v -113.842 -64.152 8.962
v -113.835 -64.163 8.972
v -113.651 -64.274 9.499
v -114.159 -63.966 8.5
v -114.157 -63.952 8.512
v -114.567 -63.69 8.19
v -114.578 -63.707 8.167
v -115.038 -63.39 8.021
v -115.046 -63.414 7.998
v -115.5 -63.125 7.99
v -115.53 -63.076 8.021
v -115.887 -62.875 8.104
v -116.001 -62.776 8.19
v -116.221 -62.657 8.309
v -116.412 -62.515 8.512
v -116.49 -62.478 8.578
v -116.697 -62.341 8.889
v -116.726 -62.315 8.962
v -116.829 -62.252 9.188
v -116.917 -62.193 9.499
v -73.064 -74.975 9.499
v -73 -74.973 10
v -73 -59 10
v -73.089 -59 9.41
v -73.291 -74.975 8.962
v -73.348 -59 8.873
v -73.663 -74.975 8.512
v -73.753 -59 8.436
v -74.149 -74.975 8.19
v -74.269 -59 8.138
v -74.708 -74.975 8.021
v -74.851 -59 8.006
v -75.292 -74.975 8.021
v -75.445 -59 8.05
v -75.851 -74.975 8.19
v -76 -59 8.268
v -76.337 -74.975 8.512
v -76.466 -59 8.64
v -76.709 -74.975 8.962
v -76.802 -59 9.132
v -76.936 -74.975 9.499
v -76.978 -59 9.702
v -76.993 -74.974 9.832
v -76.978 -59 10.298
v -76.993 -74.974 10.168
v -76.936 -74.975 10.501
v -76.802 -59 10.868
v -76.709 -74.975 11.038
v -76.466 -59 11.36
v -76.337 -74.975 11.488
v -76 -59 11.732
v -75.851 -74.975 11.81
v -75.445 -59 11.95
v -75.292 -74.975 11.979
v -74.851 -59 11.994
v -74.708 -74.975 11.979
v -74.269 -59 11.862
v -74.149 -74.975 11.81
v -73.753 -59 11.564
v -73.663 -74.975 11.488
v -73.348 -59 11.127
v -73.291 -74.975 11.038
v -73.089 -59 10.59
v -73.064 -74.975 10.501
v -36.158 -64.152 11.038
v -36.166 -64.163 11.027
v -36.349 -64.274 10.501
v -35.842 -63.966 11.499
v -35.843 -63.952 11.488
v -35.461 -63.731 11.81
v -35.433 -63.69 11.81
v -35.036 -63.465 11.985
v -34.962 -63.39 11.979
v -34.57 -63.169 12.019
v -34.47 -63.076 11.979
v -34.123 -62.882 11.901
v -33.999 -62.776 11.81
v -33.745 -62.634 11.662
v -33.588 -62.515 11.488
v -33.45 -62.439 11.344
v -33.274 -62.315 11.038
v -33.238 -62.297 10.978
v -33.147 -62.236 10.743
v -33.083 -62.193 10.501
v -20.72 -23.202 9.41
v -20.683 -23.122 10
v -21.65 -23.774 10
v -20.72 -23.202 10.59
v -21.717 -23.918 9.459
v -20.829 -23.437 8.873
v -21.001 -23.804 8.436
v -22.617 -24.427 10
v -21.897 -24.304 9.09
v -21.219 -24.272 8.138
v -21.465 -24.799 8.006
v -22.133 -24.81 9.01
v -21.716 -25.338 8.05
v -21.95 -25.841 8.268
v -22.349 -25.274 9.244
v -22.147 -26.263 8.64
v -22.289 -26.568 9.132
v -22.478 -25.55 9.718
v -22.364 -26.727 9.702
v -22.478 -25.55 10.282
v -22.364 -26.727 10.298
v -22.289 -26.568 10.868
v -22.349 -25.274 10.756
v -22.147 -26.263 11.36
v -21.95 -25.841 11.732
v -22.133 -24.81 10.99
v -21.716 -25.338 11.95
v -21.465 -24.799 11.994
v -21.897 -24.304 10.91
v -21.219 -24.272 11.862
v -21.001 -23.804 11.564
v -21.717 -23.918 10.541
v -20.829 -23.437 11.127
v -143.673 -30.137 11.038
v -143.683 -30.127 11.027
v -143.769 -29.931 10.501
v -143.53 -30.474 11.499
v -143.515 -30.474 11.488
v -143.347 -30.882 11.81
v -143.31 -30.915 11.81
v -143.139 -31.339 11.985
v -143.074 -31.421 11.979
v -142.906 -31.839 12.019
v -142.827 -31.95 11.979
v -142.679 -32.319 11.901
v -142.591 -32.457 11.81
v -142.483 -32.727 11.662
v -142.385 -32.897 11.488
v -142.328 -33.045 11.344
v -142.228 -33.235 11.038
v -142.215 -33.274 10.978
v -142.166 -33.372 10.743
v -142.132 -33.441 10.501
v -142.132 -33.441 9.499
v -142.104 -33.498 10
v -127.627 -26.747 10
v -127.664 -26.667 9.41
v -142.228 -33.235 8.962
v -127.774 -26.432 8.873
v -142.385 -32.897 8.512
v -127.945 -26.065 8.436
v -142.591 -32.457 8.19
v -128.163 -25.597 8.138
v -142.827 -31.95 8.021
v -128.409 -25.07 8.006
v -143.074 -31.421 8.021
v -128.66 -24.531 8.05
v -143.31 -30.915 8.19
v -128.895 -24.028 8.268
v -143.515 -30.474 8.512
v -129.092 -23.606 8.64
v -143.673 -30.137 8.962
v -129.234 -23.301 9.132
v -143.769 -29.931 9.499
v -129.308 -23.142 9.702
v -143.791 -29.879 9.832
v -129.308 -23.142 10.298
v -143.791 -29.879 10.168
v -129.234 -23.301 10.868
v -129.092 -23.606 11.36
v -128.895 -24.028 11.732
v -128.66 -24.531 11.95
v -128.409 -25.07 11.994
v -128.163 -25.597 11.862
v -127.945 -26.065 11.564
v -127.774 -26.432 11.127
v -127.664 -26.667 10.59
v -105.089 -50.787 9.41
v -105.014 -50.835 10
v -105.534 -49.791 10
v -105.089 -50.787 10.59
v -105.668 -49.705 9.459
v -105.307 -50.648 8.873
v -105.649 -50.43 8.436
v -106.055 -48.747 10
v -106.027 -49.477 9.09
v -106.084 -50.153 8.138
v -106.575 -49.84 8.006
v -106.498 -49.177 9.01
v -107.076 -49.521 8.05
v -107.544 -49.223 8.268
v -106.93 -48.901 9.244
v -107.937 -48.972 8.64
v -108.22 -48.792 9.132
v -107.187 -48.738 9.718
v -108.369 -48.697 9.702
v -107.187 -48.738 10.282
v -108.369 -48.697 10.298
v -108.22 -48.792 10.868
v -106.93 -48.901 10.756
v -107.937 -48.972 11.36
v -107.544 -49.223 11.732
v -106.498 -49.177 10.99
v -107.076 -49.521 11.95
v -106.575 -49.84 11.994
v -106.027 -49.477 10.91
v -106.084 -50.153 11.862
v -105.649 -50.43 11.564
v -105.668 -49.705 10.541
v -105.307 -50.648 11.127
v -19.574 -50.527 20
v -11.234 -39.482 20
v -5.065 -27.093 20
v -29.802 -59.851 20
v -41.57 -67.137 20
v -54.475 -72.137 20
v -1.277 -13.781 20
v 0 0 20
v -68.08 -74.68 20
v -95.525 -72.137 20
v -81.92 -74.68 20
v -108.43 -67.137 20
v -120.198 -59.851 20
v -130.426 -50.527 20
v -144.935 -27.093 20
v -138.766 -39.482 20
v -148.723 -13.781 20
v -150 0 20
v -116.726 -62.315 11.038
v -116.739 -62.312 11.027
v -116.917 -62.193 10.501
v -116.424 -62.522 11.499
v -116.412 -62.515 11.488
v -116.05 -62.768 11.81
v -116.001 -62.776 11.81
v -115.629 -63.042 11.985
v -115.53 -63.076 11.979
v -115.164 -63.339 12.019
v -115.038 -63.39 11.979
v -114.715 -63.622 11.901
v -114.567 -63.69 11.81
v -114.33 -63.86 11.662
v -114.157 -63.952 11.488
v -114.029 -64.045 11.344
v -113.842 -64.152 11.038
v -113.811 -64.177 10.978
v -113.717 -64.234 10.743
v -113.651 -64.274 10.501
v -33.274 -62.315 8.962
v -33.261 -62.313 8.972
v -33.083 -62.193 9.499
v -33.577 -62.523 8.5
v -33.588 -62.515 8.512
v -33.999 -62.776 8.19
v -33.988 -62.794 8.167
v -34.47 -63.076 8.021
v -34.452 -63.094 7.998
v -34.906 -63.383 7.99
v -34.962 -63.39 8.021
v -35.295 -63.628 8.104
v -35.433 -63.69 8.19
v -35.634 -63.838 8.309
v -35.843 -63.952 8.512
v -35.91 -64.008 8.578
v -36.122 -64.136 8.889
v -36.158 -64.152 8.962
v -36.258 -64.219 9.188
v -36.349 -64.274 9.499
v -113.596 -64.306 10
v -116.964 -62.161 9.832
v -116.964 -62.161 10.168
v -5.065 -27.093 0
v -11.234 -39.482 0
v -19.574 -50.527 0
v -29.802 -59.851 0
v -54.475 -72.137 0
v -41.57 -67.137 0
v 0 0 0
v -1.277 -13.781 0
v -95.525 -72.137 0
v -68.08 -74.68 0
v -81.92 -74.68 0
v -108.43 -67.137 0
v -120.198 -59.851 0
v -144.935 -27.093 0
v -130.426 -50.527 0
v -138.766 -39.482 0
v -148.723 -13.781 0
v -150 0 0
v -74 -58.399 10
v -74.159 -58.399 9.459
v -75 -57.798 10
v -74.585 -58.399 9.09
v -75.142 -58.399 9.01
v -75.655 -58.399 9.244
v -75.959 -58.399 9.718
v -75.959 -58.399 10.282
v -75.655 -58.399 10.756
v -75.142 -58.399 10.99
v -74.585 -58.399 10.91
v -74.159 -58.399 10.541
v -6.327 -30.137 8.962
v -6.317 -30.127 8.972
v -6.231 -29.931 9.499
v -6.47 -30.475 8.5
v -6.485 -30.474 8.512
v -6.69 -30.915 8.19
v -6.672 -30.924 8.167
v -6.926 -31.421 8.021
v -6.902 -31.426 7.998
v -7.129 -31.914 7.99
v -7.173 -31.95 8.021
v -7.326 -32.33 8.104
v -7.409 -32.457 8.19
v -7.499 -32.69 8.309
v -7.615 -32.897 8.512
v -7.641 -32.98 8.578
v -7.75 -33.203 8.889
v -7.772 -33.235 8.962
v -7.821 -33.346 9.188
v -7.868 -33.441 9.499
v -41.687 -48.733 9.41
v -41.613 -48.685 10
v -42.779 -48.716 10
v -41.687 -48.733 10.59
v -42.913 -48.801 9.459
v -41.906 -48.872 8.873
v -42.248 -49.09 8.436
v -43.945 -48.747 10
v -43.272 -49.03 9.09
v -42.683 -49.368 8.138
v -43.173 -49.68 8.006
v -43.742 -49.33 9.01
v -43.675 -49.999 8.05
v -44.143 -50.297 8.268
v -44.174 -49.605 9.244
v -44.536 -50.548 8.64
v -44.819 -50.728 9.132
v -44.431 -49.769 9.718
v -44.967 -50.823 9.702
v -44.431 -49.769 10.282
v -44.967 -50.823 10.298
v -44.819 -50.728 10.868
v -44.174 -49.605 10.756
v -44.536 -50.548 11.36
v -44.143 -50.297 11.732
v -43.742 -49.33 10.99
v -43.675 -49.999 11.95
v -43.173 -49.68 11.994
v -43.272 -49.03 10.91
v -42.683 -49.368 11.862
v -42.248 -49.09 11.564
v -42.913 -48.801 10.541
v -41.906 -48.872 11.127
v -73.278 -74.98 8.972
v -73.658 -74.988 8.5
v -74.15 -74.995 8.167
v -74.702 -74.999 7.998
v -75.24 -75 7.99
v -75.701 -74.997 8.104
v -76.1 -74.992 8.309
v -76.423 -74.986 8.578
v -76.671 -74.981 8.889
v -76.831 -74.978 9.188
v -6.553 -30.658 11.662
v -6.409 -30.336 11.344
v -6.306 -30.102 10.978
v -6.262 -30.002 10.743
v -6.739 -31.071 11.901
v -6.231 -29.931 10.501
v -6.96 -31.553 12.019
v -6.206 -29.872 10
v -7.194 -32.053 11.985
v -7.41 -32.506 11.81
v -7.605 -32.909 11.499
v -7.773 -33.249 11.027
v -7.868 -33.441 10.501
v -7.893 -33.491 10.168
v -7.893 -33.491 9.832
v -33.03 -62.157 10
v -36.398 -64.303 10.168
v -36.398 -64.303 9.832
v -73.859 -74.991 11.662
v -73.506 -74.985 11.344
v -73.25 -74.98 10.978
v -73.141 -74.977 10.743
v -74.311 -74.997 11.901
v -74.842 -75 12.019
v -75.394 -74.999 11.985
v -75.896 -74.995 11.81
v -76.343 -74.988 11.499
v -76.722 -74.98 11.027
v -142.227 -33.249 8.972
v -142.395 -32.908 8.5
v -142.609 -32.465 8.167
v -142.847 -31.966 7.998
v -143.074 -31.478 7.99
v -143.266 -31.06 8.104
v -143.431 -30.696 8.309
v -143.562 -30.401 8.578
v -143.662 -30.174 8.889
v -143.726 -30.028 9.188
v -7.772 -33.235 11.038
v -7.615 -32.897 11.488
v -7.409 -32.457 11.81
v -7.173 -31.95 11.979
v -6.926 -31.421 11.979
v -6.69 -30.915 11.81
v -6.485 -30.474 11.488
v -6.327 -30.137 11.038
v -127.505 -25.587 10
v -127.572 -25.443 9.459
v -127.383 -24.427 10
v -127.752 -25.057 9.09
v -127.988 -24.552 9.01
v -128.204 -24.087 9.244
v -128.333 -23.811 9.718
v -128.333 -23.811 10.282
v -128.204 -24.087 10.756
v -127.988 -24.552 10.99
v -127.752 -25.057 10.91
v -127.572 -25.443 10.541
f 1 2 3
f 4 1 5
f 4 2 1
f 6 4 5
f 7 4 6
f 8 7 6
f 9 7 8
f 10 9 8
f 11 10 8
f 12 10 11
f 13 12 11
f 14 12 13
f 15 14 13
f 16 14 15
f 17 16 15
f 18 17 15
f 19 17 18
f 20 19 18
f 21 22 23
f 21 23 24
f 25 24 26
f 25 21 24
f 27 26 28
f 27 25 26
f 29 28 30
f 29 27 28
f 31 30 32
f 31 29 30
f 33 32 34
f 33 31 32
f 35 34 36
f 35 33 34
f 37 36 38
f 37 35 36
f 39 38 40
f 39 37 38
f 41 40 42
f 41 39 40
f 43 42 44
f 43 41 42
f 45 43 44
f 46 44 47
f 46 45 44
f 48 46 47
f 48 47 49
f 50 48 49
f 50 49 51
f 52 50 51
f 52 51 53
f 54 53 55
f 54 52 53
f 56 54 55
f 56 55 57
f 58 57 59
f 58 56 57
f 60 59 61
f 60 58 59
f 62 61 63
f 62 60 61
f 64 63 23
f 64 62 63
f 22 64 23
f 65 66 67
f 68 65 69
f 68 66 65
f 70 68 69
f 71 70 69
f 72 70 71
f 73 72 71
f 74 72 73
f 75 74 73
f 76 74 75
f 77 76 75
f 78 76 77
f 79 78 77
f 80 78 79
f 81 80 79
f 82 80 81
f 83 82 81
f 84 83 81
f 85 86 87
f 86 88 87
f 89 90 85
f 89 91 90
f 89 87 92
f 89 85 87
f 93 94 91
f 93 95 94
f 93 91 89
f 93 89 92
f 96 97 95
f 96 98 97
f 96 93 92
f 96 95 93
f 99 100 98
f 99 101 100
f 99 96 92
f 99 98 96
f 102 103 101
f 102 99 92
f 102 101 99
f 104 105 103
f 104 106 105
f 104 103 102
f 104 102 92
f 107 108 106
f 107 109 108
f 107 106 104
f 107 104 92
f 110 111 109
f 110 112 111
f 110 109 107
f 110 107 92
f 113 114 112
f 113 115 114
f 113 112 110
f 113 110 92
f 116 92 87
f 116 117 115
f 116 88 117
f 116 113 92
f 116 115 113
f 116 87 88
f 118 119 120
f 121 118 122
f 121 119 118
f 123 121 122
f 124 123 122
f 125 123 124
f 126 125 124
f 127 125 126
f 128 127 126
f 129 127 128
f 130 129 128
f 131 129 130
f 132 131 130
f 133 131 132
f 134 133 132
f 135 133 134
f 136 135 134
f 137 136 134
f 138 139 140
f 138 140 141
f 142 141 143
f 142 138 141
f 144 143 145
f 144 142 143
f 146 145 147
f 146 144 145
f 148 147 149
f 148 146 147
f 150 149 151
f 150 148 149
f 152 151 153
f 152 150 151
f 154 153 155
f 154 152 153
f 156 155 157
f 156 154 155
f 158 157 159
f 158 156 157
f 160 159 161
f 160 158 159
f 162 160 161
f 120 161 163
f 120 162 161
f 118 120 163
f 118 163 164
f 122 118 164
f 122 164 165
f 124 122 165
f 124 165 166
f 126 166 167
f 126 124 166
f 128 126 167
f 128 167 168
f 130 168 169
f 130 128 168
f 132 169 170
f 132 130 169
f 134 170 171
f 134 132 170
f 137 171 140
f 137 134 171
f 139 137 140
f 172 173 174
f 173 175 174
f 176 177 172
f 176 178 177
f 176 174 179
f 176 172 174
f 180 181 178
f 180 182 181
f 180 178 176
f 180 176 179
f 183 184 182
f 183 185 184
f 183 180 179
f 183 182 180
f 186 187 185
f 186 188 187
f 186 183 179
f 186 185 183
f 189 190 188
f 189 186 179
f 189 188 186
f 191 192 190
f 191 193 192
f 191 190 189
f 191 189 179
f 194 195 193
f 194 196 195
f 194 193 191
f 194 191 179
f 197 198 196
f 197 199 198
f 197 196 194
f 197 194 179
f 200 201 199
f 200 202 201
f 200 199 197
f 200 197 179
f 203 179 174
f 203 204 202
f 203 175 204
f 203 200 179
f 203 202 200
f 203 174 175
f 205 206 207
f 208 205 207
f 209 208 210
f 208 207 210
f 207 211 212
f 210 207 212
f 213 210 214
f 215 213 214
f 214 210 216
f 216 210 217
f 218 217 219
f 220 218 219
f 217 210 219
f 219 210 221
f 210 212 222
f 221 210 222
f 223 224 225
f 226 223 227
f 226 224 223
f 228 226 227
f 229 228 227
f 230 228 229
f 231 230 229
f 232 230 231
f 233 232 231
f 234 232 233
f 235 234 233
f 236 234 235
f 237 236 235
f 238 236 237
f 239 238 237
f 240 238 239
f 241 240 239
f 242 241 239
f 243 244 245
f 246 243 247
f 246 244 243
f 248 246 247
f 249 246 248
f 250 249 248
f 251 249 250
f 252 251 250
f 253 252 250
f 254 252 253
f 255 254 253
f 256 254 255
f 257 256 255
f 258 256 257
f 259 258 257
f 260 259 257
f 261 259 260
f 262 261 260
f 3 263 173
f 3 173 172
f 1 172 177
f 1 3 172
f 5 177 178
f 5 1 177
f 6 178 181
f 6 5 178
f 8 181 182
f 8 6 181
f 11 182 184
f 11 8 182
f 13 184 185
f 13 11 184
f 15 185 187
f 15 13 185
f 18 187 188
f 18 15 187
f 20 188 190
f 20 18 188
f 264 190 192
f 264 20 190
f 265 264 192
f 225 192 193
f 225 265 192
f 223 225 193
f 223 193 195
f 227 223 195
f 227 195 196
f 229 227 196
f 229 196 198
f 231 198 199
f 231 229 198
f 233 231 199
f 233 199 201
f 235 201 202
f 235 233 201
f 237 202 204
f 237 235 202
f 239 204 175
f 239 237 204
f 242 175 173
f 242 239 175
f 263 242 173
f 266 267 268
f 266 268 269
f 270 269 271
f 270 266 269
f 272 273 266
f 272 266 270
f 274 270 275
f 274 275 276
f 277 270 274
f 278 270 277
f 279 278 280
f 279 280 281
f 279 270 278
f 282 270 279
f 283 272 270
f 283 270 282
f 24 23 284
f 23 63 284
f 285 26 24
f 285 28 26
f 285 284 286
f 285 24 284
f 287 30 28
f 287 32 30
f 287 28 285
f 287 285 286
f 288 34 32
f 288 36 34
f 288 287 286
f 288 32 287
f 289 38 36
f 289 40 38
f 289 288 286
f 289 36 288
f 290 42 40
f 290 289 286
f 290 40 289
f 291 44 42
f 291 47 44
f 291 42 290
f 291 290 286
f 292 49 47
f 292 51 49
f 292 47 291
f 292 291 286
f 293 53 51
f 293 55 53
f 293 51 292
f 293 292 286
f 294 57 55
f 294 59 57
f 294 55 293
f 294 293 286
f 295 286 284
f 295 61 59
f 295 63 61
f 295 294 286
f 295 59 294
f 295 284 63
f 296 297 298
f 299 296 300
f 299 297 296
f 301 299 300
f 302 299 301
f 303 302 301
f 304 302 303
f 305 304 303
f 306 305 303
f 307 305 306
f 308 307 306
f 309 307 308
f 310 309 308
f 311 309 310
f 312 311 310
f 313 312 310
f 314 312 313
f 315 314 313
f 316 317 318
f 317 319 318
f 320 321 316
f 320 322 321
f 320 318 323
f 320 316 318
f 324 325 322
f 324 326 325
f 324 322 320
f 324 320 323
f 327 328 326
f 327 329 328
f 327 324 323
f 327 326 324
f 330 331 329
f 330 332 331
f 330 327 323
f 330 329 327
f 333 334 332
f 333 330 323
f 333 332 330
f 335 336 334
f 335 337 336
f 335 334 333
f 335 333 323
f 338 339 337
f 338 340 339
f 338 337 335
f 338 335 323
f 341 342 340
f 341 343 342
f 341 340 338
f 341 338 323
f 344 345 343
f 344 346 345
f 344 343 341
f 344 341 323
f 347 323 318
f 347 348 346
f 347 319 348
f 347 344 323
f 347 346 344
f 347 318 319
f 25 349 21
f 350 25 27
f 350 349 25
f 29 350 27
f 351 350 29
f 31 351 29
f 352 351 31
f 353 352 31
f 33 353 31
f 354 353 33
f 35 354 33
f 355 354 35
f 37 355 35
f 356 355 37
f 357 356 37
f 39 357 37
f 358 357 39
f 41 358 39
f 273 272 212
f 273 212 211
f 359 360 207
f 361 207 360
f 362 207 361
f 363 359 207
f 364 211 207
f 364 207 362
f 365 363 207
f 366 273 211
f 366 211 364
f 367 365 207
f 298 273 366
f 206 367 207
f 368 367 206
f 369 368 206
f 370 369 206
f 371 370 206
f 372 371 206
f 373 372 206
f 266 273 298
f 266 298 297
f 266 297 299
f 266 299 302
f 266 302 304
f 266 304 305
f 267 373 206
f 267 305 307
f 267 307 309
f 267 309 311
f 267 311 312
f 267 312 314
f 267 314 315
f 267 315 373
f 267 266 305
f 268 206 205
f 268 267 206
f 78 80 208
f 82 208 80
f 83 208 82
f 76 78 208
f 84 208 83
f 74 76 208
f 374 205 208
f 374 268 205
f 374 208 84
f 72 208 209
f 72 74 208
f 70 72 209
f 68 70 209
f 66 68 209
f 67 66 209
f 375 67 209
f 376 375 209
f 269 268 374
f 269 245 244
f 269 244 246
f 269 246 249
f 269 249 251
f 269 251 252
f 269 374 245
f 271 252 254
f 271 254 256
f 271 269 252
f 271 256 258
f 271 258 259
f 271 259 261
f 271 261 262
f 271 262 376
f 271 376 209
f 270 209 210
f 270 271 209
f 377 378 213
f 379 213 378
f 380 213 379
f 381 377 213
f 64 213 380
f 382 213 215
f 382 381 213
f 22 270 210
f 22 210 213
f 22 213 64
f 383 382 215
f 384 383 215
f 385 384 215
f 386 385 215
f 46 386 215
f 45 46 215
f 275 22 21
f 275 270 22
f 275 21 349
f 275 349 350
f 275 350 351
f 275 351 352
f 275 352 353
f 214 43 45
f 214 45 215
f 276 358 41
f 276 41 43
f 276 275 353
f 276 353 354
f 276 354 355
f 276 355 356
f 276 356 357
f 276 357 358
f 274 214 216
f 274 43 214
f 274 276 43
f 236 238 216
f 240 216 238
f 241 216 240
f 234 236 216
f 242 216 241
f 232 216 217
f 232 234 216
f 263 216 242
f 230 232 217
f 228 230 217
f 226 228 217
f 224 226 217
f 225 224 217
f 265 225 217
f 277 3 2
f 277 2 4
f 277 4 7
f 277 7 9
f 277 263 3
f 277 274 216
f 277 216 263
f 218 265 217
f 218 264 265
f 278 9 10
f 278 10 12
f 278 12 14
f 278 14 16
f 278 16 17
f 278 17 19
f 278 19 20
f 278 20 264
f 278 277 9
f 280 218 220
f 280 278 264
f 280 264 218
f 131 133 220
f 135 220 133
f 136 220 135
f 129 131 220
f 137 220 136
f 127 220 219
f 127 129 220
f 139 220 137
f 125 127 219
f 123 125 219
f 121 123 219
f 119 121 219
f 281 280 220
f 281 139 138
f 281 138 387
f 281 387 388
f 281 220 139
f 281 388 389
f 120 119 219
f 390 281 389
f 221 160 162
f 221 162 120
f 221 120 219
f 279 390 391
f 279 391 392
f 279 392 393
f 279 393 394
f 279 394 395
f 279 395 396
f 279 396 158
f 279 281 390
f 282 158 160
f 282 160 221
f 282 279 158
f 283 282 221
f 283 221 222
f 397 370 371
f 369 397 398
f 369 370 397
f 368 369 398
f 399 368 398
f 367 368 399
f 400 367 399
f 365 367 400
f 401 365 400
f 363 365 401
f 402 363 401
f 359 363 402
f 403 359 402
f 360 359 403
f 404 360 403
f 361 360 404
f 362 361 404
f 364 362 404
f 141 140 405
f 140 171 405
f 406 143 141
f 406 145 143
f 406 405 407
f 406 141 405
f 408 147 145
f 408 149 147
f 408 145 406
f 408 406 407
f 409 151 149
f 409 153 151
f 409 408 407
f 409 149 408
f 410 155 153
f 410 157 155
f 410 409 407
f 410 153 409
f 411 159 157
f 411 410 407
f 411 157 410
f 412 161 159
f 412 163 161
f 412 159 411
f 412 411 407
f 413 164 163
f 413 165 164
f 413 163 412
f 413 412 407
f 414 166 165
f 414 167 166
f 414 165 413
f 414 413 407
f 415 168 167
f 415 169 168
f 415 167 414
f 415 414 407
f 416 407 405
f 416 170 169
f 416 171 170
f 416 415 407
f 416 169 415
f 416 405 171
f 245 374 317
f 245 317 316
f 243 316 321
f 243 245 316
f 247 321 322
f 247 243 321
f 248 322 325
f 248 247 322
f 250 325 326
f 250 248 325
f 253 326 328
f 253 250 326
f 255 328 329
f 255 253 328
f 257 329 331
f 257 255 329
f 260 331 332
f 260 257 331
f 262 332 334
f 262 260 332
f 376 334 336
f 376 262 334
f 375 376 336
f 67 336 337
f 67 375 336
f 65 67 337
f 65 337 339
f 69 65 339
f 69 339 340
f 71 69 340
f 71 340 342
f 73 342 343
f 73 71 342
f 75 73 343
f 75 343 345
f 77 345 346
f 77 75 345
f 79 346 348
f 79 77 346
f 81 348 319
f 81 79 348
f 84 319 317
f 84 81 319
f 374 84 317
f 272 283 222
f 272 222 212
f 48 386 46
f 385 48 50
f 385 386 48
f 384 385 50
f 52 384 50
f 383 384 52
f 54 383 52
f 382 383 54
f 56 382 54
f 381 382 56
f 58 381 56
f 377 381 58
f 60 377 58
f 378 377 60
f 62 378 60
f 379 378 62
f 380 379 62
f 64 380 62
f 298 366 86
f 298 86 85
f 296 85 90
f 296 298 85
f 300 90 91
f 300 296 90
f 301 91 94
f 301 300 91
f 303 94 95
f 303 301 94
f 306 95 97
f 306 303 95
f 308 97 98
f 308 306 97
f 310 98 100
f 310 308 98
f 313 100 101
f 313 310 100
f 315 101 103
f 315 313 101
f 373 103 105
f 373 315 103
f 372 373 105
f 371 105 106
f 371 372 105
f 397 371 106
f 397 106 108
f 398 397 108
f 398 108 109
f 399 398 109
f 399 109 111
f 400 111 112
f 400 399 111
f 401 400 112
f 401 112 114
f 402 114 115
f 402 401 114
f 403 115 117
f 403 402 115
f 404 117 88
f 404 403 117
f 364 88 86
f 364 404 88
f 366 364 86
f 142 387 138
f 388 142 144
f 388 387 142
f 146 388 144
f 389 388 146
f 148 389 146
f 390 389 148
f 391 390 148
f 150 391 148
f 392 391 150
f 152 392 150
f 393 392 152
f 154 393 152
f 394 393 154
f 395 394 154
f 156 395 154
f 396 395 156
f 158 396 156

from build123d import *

# Parameters (mm, degrees)
BOSS_EXTRUDE1_DEPTH = 20
CIRPATTERN1_COUNT   = 5
CIRPATTERN1_ANGLE   = 130


with BuildPart() as part:
    # Sketch1 → Boss-Extrude1 (new body)
    with BuildSketch(Plane.XY):
        with BuildLine():
            Line((-150, 0), (0, 0))
            ThreePointArc((0, 0), (-75, -75), (-150, 0))
        make_face()
    extrude(amount=BOSS_EXTRUDE1_DEPTH)

    # Sketch4 → Ø4.0mm Dowel Hole2 (revolve, cut)
    with BuildSketch(Plane(origin=(-7.026915972, -31.696369631, 10), x_dir=(0.4226182617407001, 0.9063077870366498, 0), z_dir=(0, 0, 1))):
        Polygon((0, 0), (0, 17.201721238), (2, 16), (2, 0.025), (2.025, 0), align=None)
    f_4_0mm_dowel_hole2 = revolve(axis=Axis((-1.271861525, -34.379995593, 10), (-0.9063077870366497, 0.42261826174070016, 0)), mode=Mode.SUBTRACT)

    # CirPattern1: Ø4.0mm Dowel Hole2 ×5 about axis
    cirpattern1_axis = Axis((-75, 0, 0), (0, 0, -1))
    for i in range(1, CIRPATTERN1_COUNT):
        add(f_4_0mm_dowel_hole2.rotate(cirpattern1_axis, i * CIRPATTERN1_ANGLE / (CIRPATTERN1_COUNT - 1)), mode=Mode.SUBTRACT)


solid = part.part
